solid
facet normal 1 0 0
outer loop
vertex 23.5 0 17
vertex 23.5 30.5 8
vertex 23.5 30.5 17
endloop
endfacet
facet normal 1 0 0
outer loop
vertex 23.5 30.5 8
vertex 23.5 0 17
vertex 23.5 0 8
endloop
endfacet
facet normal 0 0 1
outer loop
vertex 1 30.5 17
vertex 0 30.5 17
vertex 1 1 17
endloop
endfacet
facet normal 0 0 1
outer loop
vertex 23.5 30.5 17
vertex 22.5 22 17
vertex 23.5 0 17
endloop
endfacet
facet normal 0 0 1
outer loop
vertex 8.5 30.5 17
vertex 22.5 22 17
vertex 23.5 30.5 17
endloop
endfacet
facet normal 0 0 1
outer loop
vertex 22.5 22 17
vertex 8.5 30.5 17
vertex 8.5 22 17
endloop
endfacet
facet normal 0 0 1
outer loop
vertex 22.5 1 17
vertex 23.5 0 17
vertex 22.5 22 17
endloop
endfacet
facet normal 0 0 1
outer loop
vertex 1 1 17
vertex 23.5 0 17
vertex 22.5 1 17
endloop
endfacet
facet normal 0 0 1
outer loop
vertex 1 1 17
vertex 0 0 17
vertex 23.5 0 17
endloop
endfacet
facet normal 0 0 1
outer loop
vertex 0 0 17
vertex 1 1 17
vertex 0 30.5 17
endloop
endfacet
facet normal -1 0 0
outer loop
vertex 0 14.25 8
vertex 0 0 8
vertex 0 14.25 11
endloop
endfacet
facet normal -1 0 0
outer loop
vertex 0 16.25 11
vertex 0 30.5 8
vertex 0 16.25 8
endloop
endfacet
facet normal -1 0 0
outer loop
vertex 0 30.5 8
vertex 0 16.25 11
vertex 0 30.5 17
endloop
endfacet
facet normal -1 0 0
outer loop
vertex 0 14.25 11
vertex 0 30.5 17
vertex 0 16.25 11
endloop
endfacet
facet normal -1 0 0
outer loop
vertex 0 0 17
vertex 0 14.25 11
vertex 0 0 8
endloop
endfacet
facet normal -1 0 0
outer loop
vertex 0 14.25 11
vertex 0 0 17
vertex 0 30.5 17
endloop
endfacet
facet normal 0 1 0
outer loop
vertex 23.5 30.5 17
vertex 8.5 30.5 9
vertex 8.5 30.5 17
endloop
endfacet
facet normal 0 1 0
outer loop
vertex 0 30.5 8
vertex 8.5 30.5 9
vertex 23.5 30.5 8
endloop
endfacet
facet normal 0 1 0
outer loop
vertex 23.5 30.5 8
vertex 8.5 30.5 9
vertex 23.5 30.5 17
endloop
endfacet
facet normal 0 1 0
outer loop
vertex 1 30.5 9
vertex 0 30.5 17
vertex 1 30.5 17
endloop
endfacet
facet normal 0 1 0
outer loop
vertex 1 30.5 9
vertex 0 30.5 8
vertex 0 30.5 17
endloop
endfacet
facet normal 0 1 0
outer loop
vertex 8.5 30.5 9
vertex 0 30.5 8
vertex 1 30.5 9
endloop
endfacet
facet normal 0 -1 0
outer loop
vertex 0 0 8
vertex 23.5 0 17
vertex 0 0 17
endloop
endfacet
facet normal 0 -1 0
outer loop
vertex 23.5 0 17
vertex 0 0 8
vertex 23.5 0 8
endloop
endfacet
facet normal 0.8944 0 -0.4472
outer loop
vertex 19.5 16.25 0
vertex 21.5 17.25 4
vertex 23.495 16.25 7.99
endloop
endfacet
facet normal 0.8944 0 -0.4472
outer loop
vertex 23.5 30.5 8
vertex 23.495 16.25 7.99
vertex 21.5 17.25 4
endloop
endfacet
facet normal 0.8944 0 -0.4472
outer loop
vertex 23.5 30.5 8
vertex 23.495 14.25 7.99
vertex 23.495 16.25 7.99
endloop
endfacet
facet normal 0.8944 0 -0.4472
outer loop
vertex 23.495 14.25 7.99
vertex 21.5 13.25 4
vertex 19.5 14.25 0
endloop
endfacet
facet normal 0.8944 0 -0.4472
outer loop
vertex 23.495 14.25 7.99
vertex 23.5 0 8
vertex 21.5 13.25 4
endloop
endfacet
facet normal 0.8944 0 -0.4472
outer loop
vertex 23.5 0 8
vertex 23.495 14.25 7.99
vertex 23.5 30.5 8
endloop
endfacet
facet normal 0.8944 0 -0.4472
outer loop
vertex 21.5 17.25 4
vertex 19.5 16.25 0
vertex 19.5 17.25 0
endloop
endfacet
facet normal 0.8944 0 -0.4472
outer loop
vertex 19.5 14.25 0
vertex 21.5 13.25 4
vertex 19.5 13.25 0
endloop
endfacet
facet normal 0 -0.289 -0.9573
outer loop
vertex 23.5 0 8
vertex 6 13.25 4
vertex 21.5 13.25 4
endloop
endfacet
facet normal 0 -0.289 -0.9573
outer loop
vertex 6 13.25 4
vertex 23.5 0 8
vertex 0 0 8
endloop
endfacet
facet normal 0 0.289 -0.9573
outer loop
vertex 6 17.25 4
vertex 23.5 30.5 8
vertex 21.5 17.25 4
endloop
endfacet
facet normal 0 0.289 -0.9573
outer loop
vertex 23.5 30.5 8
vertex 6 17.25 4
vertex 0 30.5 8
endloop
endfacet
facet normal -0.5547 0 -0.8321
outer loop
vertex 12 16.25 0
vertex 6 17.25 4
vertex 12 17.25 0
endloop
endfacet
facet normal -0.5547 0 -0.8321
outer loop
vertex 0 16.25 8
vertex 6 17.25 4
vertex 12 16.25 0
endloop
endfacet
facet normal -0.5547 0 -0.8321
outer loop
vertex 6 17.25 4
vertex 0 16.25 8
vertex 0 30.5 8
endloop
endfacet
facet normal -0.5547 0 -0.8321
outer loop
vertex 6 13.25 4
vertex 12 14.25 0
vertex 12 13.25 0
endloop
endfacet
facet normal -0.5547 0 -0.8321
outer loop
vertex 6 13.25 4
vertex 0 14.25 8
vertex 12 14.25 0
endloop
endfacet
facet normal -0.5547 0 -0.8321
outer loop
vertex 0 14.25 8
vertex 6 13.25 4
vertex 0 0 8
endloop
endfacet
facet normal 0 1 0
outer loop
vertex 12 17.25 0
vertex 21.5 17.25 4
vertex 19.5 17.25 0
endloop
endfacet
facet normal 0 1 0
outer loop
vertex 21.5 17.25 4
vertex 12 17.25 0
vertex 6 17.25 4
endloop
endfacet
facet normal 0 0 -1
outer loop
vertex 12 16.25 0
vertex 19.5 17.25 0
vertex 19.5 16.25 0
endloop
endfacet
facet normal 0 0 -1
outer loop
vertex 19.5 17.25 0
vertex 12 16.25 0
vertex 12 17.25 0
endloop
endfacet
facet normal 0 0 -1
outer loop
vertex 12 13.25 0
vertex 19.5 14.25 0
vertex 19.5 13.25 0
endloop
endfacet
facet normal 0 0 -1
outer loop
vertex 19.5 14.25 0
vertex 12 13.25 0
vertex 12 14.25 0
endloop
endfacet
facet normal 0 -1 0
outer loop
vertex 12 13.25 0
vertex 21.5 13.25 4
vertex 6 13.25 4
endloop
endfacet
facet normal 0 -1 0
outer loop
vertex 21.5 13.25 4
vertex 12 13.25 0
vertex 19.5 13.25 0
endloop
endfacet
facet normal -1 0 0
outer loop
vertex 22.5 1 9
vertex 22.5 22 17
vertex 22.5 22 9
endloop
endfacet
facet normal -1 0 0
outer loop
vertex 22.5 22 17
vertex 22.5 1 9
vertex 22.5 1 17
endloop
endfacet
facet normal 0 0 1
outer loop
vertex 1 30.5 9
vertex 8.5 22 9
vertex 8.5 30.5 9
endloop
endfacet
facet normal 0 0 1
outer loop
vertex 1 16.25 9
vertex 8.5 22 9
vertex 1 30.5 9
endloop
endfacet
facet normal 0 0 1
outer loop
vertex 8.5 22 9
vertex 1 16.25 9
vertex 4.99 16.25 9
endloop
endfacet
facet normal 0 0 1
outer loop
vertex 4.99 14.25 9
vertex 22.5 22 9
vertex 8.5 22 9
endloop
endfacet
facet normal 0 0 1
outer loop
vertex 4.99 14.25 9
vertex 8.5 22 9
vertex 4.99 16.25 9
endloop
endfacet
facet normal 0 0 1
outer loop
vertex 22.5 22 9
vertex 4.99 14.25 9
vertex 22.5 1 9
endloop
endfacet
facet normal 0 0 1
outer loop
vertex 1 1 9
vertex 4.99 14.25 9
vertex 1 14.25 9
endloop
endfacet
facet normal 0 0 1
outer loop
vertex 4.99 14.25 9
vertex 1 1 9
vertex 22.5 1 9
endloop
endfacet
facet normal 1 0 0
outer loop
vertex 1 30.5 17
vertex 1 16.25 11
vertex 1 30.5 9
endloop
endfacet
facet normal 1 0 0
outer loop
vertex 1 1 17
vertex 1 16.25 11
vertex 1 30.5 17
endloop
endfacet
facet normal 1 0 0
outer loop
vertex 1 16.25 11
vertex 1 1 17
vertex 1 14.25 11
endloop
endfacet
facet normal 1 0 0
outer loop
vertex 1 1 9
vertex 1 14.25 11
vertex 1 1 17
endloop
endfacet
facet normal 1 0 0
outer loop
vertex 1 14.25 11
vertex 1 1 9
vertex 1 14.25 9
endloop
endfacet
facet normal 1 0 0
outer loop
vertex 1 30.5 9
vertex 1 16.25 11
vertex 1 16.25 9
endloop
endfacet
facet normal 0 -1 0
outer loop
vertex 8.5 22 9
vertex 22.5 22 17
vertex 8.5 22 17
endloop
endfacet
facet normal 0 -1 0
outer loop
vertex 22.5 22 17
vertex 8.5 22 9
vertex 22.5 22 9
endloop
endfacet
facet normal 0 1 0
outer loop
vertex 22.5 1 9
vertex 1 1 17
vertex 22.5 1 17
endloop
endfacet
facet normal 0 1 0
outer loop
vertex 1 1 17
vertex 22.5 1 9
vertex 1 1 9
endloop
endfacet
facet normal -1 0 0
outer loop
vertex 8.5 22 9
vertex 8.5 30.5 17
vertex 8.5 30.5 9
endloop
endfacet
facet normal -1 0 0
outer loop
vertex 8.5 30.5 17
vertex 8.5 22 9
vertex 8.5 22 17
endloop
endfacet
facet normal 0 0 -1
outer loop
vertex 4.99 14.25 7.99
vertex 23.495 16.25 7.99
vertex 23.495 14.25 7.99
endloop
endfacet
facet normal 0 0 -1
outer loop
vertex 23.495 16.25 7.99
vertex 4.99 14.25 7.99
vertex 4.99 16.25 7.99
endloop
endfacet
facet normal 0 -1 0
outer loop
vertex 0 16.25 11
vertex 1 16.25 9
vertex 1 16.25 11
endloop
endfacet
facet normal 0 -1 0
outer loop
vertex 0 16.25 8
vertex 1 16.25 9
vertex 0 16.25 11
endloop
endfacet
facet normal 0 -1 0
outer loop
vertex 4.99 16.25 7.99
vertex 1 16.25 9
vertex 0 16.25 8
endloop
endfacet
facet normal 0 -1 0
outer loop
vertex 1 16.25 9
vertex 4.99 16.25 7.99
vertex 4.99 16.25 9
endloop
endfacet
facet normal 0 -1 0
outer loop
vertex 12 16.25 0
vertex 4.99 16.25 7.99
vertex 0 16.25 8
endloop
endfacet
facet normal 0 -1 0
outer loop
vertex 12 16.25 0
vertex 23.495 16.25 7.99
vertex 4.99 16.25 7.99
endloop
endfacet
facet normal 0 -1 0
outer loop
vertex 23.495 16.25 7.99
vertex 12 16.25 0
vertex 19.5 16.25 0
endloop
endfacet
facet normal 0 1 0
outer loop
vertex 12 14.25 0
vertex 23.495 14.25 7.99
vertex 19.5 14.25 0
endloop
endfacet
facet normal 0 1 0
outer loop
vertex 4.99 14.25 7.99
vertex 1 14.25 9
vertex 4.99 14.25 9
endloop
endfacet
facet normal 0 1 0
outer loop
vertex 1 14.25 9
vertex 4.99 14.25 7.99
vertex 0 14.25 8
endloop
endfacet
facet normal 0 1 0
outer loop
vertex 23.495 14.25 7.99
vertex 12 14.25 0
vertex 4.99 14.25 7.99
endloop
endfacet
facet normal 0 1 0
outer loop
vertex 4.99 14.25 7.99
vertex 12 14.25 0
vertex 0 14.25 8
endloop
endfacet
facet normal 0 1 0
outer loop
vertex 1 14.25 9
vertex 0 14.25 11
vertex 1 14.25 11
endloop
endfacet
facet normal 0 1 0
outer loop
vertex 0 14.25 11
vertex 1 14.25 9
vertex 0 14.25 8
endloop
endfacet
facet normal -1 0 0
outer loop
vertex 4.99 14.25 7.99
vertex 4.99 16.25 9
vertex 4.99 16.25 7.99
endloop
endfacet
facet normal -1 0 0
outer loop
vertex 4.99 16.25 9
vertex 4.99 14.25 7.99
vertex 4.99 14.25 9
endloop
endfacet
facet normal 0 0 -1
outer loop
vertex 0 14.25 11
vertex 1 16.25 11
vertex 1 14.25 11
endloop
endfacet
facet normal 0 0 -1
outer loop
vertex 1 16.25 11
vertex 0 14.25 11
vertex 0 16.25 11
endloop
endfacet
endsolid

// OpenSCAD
board_h = 21.5;
board_w = 28.5;
board_d = 8;

difference() {
  union() {
    translate([0,0,board_d]) cube([board_h+2, board_w+2, board_d+1]);
    //translate([0,0,-8]) #cube([board_h+2,board_w+2,8.1]);
    hull() {
      translate([0,0,board_d]) cube([board_h+2, board_w+2, 1]);
      translate([6,board_w/2-1,4]) cube([board_h-6, 4, 1]);

    }
    hull() {
      translate([12,board_w/2-1,0]) cube([board_h-14, 4, 5]);
      translate([0,board_w/2-1,8]) cube([board_h+2, 4, 1]);


    }

  }
  translate([1,1,board_d+1]) cube([board_h, 21, board_d+1]);
  translate([1,20.5,board_d+1]) #cube([7.5,11.5,board_d+1]);
  translate([-0.01, board_w/2, -0.01]) cube([board_h+3, 2, board_d]);
  translate([-0.01,board_w/2,3]) #cube([5, 2, board_d]);

}
